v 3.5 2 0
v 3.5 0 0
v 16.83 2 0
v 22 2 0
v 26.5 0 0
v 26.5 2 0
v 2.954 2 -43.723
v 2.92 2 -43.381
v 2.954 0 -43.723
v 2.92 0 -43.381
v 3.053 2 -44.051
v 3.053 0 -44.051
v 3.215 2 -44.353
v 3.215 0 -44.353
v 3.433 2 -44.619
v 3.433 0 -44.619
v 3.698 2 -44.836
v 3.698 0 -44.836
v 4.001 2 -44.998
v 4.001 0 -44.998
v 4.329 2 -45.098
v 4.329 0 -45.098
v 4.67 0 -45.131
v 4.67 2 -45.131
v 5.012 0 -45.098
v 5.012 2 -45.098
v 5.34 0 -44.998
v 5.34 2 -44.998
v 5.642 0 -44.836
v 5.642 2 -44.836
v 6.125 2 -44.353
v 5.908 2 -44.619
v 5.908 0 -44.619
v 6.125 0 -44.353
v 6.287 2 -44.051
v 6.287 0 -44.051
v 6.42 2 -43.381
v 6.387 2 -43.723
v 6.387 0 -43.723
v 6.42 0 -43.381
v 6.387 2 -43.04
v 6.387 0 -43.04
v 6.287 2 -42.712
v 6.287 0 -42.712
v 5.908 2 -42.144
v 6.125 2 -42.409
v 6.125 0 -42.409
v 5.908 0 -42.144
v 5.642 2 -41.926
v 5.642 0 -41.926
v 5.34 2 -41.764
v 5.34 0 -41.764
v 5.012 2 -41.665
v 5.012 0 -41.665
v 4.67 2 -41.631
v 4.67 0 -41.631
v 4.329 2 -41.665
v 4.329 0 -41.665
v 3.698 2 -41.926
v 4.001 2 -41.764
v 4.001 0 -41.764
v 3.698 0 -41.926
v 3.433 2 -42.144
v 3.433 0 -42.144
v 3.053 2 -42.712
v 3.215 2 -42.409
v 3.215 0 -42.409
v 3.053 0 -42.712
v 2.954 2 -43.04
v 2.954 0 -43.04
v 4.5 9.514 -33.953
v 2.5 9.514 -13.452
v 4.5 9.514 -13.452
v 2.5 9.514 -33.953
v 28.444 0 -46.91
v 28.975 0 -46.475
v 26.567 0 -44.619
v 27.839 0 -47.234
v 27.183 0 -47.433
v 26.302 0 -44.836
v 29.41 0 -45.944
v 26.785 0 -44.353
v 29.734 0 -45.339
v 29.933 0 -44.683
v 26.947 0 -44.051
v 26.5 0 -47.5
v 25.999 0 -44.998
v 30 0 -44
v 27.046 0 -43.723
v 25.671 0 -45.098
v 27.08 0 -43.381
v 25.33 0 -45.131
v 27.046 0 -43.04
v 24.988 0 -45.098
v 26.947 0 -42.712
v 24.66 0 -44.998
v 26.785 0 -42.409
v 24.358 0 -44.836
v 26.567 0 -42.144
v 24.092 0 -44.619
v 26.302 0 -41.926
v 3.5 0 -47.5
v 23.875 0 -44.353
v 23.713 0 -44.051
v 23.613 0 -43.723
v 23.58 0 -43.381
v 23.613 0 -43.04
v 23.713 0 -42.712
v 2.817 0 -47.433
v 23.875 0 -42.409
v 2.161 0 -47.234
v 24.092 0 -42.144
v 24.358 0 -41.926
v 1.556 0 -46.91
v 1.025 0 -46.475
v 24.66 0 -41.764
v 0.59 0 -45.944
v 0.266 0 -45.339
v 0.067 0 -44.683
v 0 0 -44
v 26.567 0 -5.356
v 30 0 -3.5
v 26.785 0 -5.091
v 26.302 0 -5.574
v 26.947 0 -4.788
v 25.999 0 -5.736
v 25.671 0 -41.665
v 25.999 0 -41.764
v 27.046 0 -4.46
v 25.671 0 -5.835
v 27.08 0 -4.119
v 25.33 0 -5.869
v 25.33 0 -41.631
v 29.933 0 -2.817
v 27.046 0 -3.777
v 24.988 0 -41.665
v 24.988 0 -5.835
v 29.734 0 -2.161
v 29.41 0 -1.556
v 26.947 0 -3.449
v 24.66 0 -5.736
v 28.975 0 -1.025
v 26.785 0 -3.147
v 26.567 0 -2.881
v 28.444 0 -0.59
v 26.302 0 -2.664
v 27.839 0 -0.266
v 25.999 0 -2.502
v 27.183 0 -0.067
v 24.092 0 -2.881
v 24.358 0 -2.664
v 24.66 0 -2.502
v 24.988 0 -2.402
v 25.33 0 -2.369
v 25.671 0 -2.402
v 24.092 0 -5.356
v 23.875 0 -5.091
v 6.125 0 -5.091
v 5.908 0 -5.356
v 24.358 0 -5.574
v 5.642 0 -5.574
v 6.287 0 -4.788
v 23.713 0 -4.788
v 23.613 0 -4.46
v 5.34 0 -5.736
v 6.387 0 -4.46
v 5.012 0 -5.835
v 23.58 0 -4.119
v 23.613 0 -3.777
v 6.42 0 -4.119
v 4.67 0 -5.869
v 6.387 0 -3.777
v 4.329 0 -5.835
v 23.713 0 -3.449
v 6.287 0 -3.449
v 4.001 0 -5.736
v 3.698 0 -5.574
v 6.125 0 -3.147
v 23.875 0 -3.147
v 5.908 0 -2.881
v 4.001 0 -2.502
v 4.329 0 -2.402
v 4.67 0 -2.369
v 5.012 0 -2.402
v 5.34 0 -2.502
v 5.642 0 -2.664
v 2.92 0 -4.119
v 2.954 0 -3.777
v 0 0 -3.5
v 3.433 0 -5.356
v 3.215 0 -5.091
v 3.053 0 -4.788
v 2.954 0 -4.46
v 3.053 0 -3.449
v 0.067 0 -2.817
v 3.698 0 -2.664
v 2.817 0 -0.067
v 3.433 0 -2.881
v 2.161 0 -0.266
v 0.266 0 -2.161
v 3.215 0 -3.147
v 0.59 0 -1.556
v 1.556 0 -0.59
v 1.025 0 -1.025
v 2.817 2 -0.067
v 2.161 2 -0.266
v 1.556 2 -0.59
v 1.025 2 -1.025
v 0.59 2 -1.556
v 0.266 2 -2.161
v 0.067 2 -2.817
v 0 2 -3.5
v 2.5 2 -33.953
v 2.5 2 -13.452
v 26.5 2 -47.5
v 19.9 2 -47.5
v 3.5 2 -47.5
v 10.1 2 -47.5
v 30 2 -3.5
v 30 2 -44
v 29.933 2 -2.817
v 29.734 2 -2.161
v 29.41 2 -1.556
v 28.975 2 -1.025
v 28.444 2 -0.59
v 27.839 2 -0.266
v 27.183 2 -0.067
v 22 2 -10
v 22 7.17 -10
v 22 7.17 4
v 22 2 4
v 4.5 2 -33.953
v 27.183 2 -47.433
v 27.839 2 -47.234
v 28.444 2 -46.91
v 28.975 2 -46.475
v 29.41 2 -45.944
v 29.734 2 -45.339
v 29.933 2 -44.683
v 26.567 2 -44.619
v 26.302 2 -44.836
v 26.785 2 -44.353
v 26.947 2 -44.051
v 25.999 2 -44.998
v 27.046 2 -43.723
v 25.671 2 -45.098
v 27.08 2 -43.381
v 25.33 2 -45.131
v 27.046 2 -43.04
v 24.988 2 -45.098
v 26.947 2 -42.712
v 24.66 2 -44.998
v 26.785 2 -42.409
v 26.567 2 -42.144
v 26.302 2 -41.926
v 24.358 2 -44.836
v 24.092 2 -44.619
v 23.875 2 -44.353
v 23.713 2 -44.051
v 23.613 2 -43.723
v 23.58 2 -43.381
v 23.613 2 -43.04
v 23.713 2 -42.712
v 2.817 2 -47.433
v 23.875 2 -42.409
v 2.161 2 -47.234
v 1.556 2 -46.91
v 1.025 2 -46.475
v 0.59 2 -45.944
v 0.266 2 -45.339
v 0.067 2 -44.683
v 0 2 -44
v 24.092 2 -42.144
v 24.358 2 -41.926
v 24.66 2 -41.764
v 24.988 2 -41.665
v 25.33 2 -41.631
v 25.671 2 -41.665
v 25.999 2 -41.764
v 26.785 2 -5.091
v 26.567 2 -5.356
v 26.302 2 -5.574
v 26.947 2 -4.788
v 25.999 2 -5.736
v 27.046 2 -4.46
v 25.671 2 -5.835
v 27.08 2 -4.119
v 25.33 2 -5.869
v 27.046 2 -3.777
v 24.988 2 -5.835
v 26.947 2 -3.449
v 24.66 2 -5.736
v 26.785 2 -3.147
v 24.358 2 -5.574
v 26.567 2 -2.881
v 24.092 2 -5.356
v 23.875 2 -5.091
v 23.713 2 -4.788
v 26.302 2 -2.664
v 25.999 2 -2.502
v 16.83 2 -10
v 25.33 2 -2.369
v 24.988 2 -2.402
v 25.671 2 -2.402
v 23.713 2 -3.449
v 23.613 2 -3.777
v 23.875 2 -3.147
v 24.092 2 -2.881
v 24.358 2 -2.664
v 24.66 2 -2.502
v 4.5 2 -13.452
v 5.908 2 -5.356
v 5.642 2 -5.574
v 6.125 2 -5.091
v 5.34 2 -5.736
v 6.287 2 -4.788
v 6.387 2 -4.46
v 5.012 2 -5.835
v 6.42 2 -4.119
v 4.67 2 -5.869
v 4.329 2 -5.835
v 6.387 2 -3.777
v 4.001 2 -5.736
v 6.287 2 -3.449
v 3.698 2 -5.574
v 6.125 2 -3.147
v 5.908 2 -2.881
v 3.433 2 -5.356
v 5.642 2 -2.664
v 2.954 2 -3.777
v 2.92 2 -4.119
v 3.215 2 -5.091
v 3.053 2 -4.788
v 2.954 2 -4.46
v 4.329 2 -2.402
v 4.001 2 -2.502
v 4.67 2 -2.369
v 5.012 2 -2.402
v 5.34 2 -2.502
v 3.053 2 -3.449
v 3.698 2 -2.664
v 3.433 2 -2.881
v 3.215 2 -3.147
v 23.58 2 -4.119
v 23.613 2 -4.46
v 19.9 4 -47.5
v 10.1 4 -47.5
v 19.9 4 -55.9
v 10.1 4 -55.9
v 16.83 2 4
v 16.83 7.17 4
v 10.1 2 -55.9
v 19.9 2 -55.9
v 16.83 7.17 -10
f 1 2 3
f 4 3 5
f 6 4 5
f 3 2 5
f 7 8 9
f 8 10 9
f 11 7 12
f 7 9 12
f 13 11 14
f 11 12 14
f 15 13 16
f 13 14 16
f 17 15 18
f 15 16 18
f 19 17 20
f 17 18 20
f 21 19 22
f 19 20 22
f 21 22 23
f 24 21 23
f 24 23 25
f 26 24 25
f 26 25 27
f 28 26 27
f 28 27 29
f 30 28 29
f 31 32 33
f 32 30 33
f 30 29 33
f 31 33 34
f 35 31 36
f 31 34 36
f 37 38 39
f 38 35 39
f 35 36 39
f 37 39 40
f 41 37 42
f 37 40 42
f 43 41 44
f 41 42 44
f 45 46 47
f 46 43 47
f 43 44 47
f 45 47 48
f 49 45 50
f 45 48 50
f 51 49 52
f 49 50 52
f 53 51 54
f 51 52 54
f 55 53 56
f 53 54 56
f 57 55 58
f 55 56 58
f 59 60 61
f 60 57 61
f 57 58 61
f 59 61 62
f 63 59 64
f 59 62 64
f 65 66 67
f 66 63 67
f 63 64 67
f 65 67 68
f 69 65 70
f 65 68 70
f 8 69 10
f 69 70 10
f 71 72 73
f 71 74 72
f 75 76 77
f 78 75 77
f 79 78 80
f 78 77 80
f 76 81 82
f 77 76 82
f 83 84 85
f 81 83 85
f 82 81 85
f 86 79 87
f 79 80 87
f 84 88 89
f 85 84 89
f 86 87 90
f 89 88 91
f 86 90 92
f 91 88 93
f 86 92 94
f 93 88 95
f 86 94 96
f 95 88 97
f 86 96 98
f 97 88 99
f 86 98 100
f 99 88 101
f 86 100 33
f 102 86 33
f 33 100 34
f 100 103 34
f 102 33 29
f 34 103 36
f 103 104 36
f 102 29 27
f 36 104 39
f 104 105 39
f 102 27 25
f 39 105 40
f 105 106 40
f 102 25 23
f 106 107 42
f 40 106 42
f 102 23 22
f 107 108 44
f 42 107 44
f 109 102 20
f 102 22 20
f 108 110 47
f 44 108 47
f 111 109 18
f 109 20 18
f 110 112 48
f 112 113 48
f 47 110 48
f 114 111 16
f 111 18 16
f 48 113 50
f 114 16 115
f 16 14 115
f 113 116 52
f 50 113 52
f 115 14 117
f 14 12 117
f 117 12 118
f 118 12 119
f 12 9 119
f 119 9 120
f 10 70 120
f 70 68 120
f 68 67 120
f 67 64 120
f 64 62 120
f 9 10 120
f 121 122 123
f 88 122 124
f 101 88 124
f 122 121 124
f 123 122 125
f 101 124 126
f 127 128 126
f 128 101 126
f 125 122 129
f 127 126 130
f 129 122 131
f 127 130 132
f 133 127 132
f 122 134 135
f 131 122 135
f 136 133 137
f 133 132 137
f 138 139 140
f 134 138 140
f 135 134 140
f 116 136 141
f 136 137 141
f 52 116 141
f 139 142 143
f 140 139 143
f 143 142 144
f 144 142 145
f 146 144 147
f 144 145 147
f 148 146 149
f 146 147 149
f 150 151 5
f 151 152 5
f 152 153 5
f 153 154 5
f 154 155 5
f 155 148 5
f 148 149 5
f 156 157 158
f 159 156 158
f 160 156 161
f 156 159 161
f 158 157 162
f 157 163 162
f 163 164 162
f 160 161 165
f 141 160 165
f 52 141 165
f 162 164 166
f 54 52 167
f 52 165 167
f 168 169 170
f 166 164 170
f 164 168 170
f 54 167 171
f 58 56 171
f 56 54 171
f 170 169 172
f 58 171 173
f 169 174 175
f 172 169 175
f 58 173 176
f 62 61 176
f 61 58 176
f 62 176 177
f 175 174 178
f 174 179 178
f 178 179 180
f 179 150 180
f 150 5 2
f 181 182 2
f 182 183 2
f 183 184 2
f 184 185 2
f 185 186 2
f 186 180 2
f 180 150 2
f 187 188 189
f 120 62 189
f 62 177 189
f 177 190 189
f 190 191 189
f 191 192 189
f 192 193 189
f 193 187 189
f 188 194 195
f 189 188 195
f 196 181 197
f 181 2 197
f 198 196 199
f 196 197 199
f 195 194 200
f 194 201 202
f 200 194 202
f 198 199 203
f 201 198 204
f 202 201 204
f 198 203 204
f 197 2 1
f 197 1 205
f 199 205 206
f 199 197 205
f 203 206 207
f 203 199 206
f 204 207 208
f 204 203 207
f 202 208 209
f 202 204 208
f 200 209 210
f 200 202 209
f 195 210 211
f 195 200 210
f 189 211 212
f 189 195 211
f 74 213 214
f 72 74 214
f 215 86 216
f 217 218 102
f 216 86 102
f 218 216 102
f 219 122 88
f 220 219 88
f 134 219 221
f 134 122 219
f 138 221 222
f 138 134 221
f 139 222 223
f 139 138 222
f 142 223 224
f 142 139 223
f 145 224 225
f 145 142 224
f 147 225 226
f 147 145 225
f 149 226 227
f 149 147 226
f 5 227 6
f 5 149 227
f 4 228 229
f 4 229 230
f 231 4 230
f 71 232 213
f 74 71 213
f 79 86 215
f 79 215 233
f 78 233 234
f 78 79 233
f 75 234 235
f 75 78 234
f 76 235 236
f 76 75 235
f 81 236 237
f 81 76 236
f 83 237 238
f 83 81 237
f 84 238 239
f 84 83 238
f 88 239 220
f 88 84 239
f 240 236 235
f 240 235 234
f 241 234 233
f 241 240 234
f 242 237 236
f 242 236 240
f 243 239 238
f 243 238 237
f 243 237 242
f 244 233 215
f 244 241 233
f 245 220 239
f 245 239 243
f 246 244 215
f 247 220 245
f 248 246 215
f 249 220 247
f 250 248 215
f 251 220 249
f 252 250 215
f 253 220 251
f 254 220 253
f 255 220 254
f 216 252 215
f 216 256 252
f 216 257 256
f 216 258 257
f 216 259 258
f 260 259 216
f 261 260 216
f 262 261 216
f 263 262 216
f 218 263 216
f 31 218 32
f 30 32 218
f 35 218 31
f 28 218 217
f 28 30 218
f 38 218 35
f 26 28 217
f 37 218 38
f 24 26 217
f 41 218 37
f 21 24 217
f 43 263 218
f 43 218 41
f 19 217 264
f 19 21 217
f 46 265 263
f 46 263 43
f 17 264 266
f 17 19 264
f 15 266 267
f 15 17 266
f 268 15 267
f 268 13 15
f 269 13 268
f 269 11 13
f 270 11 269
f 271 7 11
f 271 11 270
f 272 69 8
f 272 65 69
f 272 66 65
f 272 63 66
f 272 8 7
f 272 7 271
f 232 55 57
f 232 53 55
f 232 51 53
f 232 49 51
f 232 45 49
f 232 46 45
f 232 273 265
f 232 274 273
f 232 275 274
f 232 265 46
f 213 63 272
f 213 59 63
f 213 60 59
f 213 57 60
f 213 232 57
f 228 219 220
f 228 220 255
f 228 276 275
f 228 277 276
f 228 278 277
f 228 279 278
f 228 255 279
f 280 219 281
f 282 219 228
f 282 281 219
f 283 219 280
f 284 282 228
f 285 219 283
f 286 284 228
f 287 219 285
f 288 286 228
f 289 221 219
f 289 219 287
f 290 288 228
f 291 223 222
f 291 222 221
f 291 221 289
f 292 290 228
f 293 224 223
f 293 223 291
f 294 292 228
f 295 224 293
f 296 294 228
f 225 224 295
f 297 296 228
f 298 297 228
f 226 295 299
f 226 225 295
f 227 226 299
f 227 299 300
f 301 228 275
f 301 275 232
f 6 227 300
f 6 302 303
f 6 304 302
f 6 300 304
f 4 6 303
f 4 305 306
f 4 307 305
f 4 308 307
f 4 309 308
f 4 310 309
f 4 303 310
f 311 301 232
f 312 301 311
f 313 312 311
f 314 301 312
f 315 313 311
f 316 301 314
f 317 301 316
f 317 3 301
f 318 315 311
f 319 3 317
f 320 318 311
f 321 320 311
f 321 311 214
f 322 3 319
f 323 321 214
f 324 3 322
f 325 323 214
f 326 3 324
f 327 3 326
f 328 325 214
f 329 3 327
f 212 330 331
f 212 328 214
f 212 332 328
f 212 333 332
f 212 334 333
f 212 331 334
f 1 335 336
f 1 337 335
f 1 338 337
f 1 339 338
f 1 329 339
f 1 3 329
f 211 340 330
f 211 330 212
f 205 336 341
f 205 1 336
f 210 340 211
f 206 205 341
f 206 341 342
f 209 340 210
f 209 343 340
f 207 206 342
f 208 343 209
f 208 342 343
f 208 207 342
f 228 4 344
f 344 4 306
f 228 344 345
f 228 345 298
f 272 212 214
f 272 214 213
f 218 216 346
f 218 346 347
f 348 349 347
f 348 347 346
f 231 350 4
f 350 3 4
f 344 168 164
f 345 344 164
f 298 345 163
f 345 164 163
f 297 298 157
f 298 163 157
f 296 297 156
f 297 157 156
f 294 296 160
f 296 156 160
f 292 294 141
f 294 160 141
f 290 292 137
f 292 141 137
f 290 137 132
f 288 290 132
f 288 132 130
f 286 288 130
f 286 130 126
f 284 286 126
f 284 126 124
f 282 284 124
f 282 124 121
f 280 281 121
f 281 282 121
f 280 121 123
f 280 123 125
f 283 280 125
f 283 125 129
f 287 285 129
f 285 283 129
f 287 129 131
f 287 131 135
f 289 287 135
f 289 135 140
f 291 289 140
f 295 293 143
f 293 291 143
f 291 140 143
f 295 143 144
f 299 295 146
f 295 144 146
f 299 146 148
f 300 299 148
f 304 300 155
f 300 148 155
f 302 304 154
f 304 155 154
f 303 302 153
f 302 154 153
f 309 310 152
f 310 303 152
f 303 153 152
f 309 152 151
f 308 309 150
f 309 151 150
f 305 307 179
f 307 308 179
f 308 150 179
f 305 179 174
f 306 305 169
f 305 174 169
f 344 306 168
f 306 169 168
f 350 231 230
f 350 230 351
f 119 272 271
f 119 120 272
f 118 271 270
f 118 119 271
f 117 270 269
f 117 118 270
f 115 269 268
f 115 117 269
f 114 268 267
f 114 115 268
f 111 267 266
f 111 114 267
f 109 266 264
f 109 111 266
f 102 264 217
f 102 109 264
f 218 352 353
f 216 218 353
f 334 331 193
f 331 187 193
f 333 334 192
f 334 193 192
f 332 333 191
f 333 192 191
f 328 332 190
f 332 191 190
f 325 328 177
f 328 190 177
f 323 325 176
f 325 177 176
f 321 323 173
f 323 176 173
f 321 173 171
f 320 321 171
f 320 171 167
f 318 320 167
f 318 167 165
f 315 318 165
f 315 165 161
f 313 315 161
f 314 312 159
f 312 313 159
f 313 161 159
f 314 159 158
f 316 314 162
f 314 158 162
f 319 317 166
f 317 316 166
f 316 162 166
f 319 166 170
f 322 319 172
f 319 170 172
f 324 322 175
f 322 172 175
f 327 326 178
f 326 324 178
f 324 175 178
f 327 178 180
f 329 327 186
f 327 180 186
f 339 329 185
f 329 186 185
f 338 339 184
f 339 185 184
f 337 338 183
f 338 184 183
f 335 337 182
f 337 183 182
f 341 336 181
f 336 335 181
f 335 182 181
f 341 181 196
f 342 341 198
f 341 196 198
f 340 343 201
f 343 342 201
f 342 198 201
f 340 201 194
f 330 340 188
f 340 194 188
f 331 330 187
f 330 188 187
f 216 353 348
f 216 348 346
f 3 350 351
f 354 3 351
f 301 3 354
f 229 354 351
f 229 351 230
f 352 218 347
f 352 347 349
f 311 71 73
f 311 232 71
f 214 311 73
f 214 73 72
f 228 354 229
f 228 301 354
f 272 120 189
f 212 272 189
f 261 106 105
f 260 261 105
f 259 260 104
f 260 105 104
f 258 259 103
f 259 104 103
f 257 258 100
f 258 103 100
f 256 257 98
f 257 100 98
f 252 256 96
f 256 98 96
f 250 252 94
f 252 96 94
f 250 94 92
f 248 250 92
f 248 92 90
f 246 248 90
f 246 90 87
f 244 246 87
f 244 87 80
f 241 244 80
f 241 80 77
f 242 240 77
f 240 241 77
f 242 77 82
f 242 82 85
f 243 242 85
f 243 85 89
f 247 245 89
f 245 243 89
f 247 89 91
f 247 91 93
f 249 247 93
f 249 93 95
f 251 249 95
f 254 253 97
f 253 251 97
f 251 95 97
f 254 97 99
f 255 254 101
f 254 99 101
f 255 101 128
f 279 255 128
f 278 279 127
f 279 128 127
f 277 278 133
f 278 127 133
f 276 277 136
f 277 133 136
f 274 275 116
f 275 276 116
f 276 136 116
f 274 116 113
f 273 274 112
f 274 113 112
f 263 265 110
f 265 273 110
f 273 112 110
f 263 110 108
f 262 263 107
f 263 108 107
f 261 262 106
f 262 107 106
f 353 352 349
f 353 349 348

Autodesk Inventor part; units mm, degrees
ref_plane "YZ Plane" through (0, 0, 0) normal (1, 0, 0) x (0, 1, 0)
ref_plane "XZ Plane" through (0, 0, 0) normal (0, 1, 0) x (-1, 0, 0)
ref_plane "XY Plane" through (0, 0, 0) normal (0, 0, 1) x (1, 0, 0)
sketch "Sketch1" plane through (0, 0, 0) normal (0, 1, 0) x (-1, 0, 0)
  line L0 (-3.5, 0) -> (-30, 0)
  line L1 (-30, -3.5) -> (-30, -44)
  line L2 (-26.5, -47.5) -> (-3.5, -47.5)
  line L3 (0, -44) -> (0, -3.5)
  line L4 (-26.5, 0) -> (-23.773, 0) construction
  circle A0 centre (-25.3298, -4.1188) radius 1.75
  circle A1 centre (-4.6702, -4.1188) radius 1.75
  circle A2 centre (-25.3298, -43.3812) radius 1.75
  circle A3 centre (-4.6702, -43.3812) radius 1.75
  arc A4 (0, -3.5) -> (-3.5, 0) centre (-3.5, -3.5) ccw
  arc A5 (-3.5, -47.5) -> (0, -44) centre (-3.5, -44) ccw
  arc A6 (-30, -44) -> (-26.5, -47.5) centre (-26.5, -44) ccw
  arc A7 (-26.5, 0) -> (-30, -3.5) centre (-26.5, -3.5) ccw
  point P0 (0, 0)
  point P1 (-30, -47.5)
  point P2 (0, -47.5)
  dimension "d0" = 30
  dimension "d1" = 47.5
  dimension "d4" = 3.5
  dimension "d5" = 3.5
  dimension "d6" = 3.5
extrude "Extrusion1" add sketch "Sketch1" along normal blind 2
sketch "Sketch2" plane through (0, 2, 0) normal (0, 1, 0) x (1, 0, 0)
  line L0 (30, 0) -> (22, 0)
  line L1 (3.5, 0) -> (26.5, 0) projected
  line L2 (22, 0) -> (22, -4)
  line L3 (22, 0) -> (26, 0) construction
  line L4 (22, -4) -> (16.83, -4)
  line L5 (16.83, -4) -> (16.83, 10)
  line L6 (16.83, 10) -> (22, 10)
  line L7 (22, 10) -> (22, 0)
  point P0 (0, 0)
  dimension "d9" = 8
  dimension "d12" = 4
  dimension "d13" = 90
  dimension "d14" = 5.17
  dimension "d15" = 14
extrude "Extrusion2" add sketch "Sketch2" along normal blind 5.17
sketch "Sketch3" plane through (0, 2, 0) normal (0, 1, 0) x (1, 0, 0)
  line L0 (26.5, 47.5) -> (3.5, 47.5) projected
  line L1 (15, 47.5) -> (10.1, 47.5)
  line L2 (10.1, 47.5) -> (10.1, 55.9)
  line L3 (10.1, 55.9) -> (19.9, 55.9)
  line L4 (19.9, 55.9) -> (19.9, 47.5)
  point P0 (0, 0)
  dimension "d18" = 4.9
  dimension "d19" = 8.4
  dimension "d20" = 9.8
extrude "Extrusion3" add sketch "Sketch3" along normal blind 2
sketch "Sketch4" plane through (0, 2, 0) normal (0, 1, 0) x (1, 0, 0)
  arc A0 (3.5, 47.5) -> (0, 44) centre (3.5, 44) ccw projected
  line L0 (0, 44) -> (0, 3.5) projected
  arc A1 (0, 3.5) -> (3.5, 0) centre (3.5, 3.5) ccw projected
  line L1 (3.5, 0) -> (3.5, 13.452)
  line L2 (3.5, 13.452) -> (2.5, 13.452)
  line L3 (10.1, 47.5) -> (3.5, 47.5) projected
  line L4 (3.5, 47.5) -> (3.5, 33.953)
  line L5 (3.5, 33.953) -> (2.5, 33.953)
  line L6 (2.5, 33.953) -> (2.5, 13.452)
  line L7 (3.5, 13.452) -> (4.5, 13.452)
  line L8 (3.5, 33.953) -> (4.5, 33.953)
  line L9 (4.5, 33.953) -> (4.5, 13.452)
  point P0 (0, 0)
  dimension "d26" = 13.452
  dimension "d27" = 1
  dimension "d28" = 13.547
  dimension "d29" = 1
  dimension "d30" = 1
extrude "Extrusion4" add sketch "Sketch4" along normal blind 7.514 contours L8 L9 L7 L2 L6 L5
properties part number "voice recognition"
